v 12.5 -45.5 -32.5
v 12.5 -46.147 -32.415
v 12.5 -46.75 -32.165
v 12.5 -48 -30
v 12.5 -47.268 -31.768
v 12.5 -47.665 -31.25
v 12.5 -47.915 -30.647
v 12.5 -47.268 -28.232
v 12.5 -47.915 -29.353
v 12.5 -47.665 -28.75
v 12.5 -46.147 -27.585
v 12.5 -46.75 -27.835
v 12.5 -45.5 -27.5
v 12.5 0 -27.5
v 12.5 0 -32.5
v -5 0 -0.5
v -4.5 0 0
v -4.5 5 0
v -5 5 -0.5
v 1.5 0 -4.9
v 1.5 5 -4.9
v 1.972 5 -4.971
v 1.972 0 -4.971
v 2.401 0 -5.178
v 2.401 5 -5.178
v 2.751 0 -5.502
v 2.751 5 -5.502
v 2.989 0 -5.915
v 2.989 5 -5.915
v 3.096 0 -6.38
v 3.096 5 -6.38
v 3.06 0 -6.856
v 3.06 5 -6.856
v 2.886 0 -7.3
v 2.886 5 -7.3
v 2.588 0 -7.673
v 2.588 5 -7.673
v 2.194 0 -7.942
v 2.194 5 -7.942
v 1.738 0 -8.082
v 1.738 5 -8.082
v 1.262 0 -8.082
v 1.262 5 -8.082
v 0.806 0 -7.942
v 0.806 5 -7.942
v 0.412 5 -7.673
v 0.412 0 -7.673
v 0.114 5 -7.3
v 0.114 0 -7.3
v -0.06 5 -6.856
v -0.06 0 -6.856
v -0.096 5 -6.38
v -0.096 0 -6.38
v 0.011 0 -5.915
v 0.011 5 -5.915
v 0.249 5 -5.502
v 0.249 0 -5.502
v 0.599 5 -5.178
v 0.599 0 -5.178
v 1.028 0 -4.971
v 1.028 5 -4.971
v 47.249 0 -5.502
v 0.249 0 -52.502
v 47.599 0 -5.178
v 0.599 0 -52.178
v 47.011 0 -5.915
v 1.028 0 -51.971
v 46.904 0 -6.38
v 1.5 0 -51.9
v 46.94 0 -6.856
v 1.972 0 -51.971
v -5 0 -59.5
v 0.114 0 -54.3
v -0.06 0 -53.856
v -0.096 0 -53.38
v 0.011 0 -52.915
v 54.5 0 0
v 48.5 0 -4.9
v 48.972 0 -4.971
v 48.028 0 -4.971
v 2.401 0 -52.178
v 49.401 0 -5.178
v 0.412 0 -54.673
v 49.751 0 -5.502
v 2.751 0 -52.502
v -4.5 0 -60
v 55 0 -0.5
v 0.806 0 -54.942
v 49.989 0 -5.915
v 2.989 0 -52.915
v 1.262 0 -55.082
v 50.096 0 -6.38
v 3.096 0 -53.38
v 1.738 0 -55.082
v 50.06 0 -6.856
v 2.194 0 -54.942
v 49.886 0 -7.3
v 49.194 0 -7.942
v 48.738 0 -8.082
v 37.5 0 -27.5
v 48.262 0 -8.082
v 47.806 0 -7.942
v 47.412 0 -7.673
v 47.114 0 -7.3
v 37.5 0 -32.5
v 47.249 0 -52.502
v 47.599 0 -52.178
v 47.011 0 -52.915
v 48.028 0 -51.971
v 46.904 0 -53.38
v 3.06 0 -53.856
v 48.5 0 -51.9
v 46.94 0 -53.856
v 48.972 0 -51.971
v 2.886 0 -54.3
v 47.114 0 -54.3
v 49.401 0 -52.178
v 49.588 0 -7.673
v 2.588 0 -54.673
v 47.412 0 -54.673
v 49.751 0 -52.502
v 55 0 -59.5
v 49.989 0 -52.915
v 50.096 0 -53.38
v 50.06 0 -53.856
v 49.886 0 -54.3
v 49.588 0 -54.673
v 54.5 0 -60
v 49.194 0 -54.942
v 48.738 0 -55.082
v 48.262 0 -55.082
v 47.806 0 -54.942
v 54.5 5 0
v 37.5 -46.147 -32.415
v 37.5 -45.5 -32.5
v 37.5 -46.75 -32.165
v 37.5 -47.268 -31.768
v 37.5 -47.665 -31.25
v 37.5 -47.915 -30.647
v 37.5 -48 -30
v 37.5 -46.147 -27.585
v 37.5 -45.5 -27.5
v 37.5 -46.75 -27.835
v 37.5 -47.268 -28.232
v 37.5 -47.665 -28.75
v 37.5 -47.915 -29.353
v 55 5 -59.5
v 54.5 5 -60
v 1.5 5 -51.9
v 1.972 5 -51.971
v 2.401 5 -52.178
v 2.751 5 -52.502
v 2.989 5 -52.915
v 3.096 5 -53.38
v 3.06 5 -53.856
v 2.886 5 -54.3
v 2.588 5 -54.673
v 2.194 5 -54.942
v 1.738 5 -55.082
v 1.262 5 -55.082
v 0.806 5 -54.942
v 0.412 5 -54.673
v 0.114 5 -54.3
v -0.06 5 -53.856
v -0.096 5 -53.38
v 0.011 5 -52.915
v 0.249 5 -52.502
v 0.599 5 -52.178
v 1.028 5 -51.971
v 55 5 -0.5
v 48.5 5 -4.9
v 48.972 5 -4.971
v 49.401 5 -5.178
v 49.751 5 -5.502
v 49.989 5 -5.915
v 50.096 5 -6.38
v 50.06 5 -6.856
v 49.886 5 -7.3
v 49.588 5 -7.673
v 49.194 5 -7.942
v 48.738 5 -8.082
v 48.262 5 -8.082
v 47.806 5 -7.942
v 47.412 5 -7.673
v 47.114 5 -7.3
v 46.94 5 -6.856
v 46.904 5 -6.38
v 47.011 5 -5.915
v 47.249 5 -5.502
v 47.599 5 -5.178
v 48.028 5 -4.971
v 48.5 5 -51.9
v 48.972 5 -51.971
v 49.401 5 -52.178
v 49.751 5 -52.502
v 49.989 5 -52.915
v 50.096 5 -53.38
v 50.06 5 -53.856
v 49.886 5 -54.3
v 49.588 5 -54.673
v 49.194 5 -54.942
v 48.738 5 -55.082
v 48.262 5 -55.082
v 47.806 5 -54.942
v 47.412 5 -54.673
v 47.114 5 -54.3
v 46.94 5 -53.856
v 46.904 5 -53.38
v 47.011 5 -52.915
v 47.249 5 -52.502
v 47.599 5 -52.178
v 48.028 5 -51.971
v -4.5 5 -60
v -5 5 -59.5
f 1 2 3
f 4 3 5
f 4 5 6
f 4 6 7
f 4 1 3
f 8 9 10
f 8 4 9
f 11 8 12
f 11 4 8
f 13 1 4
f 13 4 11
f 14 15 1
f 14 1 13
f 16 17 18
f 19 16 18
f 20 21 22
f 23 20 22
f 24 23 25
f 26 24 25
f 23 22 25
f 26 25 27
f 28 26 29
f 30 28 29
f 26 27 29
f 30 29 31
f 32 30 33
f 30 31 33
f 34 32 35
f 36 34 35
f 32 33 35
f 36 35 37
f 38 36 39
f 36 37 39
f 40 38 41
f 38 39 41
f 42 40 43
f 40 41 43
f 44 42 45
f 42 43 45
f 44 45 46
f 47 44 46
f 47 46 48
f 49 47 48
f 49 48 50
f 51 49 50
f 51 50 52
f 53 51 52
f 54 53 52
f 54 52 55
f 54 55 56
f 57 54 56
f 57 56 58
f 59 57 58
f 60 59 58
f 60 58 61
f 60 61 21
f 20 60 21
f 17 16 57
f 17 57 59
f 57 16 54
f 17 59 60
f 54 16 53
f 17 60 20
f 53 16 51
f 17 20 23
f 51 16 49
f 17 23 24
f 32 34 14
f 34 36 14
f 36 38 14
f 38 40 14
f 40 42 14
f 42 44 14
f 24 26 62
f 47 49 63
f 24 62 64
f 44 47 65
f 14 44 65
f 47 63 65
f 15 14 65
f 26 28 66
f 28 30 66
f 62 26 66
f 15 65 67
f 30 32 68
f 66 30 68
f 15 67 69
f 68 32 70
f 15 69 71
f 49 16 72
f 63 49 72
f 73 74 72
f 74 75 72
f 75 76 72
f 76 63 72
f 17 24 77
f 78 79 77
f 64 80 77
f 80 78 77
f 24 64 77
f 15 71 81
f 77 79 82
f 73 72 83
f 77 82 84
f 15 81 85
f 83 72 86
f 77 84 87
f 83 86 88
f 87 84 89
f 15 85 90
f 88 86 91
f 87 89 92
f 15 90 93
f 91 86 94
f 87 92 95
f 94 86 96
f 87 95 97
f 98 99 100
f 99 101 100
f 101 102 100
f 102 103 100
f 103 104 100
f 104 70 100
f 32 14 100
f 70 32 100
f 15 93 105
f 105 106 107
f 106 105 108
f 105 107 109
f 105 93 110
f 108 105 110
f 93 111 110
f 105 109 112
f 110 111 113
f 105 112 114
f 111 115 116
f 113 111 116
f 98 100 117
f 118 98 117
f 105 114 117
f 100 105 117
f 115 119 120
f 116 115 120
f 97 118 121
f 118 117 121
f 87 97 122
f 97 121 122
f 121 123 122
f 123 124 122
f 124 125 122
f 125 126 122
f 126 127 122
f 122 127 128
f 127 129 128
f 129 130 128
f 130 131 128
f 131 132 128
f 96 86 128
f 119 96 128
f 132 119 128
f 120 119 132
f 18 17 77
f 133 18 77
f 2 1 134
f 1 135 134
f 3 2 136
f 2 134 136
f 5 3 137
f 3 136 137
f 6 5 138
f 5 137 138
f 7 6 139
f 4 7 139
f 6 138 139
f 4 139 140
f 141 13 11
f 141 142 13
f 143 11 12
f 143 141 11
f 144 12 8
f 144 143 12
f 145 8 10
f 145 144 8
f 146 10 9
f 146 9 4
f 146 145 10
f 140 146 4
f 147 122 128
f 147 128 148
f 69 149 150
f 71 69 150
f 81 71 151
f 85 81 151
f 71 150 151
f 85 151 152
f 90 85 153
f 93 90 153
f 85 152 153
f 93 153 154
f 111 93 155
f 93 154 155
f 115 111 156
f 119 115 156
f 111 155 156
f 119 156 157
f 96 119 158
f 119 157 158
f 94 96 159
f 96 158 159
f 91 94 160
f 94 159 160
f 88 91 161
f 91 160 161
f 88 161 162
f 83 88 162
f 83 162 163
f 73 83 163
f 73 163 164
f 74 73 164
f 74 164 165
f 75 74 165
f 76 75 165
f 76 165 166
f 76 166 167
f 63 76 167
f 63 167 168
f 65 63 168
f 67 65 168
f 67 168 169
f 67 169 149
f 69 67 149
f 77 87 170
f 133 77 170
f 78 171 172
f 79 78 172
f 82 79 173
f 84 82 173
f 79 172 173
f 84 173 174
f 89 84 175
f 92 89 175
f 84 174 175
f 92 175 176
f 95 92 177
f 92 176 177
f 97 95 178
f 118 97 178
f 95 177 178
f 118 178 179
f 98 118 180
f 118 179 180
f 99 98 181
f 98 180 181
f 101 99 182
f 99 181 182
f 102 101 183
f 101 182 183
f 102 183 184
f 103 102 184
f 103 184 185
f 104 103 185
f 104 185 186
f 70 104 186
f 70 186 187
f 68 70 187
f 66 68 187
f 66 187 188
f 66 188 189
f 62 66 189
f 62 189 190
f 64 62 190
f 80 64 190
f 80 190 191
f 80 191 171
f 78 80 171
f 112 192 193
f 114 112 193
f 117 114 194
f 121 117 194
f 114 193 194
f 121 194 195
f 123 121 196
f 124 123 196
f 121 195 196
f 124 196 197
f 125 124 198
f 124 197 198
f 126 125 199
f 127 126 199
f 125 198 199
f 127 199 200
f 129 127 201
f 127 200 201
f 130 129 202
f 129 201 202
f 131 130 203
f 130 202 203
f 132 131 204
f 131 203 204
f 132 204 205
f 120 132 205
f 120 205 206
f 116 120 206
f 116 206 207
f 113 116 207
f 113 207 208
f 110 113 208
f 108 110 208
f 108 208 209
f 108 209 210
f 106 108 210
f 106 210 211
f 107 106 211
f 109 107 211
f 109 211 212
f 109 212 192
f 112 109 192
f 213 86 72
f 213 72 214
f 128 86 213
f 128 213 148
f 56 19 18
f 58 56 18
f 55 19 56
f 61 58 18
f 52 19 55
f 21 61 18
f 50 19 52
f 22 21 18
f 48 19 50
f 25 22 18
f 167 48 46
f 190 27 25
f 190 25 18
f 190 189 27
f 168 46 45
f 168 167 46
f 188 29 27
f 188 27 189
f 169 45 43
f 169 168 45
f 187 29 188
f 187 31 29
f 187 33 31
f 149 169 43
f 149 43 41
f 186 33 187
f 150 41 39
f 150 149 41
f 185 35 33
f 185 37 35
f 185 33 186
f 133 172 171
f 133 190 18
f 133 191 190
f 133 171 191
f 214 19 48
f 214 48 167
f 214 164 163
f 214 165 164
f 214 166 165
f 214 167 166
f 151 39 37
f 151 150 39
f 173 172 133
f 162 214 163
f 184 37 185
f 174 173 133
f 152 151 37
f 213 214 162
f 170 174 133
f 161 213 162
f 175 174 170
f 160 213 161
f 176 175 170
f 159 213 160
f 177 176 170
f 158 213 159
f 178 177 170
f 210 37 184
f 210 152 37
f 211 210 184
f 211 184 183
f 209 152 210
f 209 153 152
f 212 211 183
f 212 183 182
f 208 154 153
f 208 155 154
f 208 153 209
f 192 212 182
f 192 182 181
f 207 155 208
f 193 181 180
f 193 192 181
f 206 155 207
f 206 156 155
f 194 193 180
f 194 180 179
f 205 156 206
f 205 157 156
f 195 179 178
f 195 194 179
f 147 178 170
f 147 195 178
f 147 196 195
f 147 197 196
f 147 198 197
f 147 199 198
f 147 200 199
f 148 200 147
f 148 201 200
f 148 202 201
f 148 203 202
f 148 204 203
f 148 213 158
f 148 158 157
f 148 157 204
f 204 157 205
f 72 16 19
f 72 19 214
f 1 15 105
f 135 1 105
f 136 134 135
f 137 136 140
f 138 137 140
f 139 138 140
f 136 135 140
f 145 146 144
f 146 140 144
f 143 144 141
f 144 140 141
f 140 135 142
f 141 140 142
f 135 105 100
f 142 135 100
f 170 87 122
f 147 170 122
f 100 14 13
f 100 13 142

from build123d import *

# Parameters (mm, degrees)
SKIZZE1_W                       = 60
SKIZZE1_H                       = 60
AUFSATZ_LINEAR_AUSTRAGEN1_DEPTH = 5
SKIZZE7_R                       = 1.6
SCHNITT_LINEAR_AUSTRAGEN1_DEPTH = 10
FASE1_SIZE                      = 0.5
SKIZZE8_W                       = 25
SKIZZE8_H                       = 5
AUFSATZ_LINEAR_AUSTRAGEN2_DEPTH = 48
VERRUNDUNG3_R                   = 2.5


with BuildPart() as part:
    # Skizze1 → Aufsatz-Linear austragen1 (new body)
    with BuildSketch(Plane(origin=(0, 0, 0), x_dir=(1, 0, 0), z_dir=(0, 1, 0))):
        with Locations((25, 30)):
            Rectangle(SKIZZE1_W, SKIZZE1_H)
    extrude(amount=AUFSATZ_LINEAR_AUSTRAGEN1_DEPTH)

    # Skizze7 → Schnitt-Linear austragen1 (cut)
    with BuildSketch(Plane(origin=(0, 5, 0), x_dir=(1, 0, 0), z_dir=(0, 1, 0))):
        with Locations(Location((1.5, 53.5, 0), (0, 0, 270))):
            Circle(SKIZZE7_R)
        with Locations(Location((48.5, 53.5, 0), (0, 0, 270))):
            Circle(SKIZZE7_R)
        with Locations(Location((48.5, 6.5, 0), (0, 0, 270))):
            Circle(SKIZZE7_R)
        with Locations(Location((1.5, 6.5, 0), (0, 0, 270))):
            Circle(SKIZZE7_R)
    extrude(amount=-SCHNITT_LINEAR_AUSTRAGEN1_DEPTH, mode=Mode.SUBTRACT)

    # Fase1
    fase1_edges = [part.edges().sort_by_distance(p)[0] for p in [
        (-5, 2.5, -60),
        (55, 2.5, -60),
        (55, 2.5, 0),
        (-5, 2.5, 0),
    ]]
    chamfer(fase1_edges, length=FASE1_SIZE)

    # Skizze8 → Aufsatz-Linear austragen2 (add)
    with BuildSketch(Plane.XZ):
        with Locations((25, -30)):
            Rectangle(SKIZZE8_W, SKIZZE8_H)
    extrude(amount=AUFSATZ_LINEAR_AUSTRAGEN2_DEPTH)

    # Verrundung3
    verrundung3_edges = [part.edges().sort_by_distance(p)[0] for p in [
        (25, -48, -32.5),
        (25, -48, -27.5),
    ]]
    fillet(verrundung3_edges, radius=VERRUNDUNG3_R - 0.0001)  # a hair under: the kernel refuses the full size


solid = part.part
